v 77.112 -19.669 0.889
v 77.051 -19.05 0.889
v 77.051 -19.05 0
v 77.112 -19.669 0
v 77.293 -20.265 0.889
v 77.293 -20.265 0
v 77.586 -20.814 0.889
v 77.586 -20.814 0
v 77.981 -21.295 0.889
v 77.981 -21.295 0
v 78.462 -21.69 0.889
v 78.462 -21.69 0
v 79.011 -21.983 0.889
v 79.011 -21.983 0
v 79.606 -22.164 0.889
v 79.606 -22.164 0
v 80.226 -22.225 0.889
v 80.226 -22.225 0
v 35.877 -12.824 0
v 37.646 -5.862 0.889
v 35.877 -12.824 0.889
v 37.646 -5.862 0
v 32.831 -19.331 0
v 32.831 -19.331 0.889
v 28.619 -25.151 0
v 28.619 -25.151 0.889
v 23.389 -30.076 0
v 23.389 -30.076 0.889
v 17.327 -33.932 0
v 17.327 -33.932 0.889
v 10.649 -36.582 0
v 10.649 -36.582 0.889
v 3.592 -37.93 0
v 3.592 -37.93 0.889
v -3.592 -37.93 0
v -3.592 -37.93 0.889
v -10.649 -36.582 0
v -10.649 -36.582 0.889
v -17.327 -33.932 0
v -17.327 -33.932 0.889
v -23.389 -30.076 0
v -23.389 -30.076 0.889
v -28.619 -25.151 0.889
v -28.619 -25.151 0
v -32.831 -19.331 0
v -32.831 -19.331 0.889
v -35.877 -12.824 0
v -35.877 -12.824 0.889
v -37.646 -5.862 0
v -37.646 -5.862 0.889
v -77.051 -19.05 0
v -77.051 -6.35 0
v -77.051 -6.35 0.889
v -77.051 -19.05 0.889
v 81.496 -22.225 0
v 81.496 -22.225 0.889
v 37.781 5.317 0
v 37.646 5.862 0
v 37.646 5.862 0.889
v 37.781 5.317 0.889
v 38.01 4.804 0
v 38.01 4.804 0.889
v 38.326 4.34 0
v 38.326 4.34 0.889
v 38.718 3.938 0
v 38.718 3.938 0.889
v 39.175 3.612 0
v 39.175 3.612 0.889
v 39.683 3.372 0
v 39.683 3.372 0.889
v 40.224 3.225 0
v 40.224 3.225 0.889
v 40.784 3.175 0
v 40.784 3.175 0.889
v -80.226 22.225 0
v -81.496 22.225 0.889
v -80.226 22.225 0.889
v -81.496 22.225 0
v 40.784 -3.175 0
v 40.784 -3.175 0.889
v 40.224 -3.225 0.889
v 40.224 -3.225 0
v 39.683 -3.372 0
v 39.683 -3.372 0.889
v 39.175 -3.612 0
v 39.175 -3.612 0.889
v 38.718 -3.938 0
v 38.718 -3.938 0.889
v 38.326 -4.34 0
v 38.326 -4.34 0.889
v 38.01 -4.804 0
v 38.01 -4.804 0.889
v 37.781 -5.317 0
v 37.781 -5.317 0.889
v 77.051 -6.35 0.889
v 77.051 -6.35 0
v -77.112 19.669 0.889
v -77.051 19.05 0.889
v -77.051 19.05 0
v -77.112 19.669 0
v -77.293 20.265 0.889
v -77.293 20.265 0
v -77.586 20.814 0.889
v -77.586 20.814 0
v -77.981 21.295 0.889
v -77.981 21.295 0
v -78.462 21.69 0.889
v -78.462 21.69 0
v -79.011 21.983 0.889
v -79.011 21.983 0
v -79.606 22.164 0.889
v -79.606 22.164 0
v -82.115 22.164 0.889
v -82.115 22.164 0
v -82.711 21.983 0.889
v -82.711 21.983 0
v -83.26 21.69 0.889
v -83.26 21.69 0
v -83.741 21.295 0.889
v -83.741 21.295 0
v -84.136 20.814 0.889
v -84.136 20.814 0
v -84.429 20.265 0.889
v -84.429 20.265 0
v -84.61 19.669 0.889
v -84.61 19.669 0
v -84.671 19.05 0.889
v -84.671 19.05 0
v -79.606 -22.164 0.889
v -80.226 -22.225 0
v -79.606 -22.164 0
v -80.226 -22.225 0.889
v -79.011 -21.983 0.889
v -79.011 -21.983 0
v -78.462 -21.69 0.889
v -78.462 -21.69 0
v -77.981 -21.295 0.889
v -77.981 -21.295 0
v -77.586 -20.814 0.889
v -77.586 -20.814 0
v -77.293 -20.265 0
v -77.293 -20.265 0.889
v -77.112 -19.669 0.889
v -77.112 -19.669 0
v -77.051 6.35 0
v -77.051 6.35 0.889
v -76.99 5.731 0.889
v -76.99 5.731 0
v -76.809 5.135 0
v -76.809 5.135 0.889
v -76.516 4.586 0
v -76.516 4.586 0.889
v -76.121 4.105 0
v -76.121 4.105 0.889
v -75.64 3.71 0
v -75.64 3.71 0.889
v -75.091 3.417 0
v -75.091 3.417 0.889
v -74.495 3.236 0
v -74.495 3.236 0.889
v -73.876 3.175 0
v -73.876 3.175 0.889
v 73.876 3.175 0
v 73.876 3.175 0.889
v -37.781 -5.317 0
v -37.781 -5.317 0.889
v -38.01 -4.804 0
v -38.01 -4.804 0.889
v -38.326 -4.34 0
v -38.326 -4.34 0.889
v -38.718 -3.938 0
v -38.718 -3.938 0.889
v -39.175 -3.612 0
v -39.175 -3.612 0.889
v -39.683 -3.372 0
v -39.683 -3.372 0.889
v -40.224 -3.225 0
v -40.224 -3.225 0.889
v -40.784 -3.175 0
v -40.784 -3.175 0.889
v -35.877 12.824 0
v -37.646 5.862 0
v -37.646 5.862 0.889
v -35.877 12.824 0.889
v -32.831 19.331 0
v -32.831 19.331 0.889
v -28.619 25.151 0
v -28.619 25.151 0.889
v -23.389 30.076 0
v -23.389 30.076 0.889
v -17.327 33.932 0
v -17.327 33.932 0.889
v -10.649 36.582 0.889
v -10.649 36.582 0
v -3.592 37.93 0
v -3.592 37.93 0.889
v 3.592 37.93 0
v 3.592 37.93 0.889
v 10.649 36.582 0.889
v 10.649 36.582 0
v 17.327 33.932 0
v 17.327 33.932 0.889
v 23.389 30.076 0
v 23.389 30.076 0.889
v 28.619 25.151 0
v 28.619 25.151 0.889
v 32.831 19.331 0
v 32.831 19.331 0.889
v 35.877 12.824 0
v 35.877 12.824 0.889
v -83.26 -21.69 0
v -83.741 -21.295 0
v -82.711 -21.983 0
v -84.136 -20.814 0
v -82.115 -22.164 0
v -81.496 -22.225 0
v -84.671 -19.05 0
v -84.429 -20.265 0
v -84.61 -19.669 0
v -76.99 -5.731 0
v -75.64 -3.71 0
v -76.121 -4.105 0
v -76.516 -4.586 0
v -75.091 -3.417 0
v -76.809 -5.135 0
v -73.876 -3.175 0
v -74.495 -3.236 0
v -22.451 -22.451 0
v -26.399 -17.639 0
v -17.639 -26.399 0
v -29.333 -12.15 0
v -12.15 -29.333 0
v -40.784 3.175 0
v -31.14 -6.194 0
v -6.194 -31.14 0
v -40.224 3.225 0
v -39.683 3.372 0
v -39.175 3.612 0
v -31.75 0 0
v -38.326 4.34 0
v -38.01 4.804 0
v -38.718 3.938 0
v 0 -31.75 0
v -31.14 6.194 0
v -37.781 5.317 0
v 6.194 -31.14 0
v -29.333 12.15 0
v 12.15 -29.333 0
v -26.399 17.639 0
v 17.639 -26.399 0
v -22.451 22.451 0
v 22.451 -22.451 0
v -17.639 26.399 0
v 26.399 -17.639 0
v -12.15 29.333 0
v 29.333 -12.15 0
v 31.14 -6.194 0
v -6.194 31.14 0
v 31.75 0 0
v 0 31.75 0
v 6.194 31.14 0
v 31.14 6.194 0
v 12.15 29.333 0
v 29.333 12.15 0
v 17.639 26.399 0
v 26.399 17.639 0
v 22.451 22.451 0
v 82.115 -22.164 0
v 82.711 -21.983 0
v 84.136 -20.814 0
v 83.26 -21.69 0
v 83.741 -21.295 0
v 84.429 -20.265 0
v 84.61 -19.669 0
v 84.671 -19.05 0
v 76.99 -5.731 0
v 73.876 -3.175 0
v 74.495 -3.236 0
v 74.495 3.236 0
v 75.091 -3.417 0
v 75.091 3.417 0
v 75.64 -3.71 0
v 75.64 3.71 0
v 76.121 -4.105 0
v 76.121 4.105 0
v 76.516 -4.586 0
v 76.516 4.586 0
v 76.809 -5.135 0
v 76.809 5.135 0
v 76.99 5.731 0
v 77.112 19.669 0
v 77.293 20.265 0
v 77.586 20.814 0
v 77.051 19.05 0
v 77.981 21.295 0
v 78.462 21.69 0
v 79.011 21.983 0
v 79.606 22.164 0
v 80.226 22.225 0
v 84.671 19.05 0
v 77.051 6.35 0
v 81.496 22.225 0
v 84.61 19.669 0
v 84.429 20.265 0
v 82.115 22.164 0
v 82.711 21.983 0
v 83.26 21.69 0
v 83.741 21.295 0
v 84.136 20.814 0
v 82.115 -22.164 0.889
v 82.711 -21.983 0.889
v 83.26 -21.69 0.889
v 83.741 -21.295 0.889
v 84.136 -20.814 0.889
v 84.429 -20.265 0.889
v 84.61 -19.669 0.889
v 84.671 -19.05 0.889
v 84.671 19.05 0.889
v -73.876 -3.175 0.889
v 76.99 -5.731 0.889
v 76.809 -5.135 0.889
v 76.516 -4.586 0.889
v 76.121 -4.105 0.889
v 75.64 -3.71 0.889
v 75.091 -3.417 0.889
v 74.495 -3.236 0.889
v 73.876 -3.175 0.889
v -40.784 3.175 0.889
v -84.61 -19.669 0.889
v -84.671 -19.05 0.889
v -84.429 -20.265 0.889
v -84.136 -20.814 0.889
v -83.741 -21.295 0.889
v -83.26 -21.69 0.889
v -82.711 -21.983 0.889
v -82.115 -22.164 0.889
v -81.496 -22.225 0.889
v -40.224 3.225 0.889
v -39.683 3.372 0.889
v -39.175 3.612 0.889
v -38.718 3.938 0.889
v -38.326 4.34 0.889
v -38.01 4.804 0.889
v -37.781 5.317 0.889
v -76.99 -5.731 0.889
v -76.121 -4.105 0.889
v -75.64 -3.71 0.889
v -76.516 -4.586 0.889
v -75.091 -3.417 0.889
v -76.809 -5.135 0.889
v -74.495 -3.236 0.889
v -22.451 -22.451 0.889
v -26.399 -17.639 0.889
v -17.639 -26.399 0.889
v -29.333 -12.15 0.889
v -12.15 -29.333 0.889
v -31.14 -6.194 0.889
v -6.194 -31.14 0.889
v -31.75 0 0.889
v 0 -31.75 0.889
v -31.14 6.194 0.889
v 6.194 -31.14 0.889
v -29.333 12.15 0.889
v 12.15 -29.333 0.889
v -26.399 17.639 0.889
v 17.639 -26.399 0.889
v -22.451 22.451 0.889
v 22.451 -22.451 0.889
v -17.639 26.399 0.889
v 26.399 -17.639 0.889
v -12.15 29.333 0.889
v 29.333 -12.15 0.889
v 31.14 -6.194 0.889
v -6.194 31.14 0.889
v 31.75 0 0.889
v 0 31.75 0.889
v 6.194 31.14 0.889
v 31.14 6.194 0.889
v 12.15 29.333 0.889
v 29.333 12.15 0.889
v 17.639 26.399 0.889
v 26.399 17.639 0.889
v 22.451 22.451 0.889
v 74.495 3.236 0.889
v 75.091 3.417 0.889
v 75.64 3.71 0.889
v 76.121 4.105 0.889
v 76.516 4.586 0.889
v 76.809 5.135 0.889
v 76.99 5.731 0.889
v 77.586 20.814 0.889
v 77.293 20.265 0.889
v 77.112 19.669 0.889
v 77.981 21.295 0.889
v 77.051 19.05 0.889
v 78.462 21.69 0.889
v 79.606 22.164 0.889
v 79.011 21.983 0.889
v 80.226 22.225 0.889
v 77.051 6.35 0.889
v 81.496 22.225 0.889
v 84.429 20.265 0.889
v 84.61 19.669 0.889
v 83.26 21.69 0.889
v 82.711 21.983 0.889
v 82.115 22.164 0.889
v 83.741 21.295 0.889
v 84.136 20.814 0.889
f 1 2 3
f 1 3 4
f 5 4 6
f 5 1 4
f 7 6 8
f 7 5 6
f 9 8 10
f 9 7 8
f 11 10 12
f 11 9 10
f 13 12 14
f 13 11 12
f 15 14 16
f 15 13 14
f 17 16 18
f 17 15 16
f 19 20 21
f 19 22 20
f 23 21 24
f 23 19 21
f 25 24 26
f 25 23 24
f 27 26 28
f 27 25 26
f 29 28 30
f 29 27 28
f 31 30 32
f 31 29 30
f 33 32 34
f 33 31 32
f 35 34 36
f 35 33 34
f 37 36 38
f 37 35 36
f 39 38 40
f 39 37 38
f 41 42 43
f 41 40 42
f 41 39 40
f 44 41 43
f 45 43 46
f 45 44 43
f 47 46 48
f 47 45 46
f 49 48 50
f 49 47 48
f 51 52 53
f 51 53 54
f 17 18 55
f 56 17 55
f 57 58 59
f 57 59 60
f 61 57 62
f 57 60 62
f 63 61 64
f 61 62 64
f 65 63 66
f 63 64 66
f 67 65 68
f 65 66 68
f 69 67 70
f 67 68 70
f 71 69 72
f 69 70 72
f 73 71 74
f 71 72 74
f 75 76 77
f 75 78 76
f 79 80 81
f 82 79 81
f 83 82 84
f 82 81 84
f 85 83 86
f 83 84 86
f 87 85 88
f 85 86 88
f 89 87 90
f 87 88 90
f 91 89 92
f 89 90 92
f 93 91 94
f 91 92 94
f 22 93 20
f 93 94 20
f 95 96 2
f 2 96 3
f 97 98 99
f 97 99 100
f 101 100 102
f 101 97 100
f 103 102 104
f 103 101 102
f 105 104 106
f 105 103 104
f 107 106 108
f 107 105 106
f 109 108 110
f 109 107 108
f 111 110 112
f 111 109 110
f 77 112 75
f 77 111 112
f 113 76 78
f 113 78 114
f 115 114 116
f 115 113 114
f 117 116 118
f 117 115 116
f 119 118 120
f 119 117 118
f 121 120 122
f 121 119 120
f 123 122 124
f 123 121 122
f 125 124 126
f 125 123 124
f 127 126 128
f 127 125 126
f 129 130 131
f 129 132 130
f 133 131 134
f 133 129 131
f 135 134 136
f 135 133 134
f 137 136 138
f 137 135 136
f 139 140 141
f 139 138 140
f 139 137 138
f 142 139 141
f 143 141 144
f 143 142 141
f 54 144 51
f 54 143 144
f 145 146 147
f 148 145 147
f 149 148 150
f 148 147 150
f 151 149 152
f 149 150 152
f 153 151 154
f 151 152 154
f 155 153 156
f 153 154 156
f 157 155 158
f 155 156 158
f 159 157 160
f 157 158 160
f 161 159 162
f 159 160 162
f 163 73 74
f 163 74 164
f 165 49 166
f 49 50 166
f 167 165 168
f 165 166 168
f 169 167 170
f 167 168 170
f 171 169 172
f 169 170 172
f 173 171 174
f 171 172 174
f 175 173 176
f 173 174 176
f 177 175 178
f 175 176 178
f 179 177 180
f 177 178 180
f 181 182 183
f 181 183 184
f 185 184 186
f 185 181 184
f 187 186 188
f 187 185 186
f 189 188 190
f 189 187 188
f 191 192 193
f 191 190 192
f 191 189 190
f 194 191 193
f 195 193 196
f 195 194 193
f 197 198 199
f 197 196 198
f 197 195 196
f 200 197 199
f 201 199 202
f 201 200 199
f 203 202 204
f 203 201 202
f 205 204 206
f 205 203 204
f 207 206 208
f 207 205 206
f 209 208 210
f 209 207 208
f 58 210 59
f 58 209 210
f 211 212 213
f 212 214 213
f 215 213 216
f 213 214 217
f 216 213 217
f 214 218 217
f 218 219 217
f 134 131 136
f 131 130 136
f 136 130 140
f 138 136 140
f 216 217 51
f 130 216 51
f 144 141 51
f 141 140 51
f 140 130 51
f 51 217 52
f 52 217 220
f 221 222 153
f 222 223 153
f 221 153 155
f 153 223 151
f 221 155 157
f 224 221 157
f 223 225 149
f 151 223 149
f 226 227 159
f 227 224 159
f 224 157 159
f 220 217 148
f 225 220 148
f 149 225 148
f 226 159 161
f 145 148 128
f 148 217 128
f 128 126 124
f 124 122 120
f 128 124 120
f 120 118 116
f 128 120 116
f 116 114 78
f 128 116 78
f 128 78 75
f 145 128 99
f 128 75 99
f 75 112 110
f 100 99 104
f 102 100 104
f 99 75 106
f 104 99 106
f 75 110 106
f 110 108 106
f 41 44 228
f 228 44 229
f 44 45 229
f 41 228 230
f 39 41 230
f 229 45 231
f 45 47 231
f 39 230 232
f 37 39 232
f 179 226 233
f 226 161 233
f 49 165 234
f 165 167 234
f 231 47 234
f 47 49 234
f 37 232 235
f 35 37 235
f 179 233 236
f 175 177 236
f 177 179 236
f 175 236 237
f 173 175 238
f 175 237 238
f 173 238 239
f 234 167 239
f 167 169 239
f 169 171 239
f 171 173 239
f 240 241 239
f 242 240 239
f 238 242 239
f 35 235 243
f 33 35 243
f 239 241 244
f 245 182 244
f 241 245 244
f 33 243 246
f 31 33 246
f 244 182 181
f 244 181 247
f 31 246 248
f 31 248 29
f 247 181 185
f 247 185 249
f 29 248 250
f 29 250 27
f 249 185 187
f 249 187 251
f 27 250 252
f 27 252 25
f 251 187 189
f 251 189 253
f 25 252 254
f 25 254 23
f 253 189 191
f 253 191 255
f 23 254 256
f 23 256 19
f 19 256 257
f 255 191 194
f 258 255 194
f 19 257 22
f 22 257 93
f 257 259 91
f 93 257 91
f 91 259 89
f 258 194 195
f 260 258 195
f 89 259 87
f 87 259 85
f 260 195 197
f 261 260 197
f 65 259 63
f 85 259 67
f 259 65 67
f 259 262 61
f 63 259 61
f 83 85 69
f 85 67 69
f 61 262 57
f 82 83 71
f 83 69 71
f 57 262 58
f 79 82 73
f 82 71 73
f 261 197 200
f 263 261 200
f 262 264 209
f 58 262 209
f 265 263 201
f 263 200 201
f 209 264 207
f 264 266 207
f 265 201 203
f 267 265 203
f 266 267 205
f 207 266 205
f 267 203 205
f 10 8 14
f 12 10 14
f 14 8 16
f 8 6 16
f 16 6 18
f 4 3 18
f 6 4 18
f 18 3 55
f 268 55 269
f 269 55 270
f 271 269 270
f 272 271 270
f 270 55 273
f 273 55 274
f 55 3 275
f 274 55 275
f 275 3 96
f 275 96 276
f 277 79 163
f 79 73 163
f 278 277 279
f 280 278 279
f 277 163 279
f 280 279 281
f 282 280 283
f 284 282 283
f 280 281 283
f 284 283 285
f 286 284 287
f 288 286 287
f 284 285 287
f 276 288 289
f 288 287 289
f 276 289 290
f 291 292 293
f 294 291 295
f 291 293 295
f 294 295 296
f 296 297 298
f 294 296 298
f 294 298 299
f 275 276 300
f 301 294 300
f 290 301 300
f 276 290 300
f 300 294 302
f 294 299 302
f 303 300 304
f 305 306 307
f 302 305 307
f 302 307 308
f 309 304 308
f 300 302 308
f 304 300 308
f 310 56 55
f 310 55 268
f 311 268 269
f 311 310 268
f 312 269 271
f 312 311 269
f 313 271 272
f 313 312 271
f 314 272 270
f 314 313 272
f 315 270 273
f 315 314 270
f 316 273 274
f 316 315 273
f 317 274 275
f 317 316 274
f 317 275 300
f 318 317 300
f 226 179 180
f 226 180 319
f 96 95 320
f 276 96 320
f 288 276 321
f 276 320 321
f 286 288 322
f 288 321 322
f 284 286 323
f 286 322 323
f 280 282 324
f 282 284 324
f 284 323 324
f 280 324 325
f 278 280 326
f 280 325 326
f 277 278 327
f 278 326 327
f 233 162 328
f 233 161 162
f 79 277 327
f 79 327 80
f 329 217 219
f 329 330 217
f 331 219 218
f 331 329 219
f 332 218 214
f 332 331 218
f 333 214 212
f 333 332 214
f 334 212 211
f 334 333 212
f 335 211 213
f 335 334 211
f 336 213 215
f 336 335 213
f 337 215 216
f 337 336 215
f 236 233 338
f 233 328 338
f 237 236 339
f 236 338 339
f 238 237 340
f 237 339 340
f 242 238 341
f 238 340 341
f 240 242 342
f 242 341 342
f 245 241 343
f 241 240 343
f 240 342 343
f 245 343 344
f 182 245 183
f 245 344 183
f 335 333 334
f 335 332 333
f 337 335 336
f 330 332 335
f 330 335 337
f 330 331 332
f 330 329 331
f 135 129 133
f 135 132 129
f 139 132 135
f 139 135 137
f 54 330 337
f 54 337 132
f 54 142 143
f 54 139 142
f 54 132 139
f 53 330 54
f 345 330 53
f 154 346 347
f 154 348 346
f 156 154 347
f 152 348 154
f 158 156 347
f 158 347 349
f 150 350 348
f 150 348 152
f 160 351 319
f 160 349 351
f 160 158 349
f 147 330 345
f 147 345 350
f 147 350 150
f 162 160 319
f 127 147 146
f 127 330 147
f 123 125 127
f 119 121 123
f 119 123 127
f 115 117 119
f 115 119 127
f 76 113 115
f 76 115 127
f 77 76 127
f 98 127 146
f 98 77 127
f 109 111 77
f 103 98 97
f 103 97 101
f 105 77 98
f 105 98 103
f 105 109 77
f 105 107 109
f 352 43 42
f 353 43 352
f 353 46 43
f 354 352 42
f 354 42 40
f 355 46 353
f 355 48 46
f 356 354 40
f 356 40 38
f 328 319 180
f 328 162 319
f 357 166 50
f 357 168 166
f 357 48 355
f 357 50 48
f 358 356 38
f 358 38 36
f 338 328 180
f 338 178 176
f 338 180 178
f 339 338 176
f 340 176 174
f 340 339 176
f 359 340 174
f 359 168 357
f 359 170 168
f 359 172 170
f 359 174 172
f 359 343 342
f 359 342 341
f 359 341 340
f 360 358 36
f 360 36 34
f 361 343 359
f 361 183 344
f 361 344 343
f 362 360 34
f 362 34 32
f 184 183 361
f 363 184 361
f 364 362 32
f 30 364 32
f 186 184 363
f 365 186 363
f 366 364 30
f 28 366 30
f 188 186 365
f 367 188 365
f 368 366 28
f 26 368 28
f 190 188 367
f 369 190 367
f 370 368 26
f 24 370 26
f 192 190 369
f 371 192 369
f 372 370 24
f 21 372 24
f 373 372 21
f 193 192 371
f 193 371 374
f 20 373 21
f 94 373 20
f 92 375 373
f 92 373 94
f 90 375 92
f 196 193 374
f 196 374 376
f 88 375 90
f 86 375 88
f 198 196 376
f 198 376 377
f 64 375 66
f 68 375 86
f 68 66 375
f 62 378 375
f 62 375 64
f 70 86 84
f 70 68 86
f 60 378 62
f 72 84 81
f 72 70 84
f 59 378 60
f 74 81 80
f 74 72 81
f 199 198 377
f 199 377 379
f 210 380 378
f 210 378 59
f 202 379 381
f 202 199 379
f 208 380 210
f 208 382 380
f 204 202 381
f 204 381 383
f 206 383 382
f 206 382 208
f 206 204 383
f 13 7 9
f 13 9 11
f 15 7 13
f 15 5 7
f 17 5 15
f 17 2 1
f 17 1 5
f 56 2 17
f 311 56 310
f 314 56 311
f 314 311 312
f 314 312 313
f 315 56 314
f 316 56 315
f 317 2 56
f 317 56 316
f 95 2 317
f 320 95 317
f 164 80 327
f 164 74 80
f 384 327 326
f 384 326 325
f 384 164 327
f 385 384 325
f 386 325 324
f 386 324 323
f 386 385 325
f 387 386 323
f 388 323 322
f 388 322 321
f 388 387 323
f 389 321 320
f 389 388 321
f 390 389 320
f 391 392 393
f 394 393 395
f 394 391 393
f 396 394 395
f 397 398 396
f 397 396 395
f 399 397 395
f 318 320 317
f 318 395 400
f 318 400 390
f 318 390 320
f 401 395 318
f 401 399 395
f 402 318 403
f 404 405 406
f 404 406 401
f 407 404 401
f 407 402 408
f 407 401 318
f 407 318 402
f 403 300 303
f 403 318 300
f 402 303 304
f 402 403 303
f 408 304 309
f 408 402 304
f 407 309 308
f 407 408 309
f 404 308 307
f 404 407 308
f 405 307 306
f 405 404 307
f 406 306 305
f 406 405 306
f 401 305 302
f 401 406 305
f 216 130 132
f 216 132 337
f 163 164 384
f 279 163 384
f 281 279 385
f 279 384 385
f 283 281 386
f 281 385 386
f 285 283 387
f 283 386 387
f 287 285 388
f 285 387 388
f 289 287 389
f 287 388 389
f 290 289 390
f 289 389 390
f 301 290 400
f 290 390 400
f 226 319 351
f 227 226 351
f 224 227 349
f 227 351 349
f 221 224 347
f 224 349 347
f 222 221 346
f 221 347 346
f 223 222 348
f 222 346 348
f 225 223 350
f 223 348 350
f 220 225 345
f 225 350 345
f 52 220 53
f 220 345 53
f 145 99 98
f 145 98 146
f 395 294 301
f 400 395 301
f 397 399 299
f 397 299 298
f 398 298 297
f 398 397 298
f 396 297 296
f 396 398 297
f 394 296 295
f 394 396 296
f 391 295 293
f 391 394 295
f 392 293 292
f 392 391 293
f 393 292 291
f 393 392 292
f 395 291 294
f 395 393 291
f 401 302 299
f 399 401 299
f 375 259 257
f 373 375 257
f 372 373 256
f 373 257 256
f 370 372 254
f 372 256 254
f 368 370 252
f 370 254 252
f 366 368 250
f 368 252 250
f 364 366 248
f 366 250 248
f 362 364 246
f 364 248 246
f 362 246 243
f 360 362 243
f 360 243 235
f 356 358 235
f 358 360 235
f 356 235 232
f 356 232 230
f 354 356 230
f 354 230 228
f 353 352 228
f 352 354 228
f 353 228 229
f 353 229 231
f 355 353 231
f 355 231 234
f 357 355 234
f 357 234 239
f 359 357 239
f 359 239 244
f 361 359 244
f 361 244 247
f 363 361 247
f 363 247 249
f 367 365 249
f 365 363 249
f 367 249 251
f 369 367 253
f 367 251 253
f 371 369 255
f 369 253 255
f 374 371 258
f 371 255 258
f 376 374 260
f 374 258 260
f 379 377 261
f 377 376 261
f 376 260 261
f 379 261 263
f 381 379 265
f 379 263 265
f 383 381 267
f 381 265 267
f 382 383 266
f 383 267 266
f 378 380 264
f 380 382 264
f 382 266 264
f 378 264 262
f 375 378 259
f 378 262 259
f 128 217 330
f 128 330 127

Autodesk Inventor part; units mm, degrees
ref_plane "YZ Plane" through (0, 0, 0) normal (1, 0, 0) x (0, 1, 0)
ref_plane "XZ Plane" through (0, 0, 0) normal (0, 1, 0) x (-1, 0, 0)
ref_plane "XY Plane" through (0, 0, 0) normal (0, 0, 1) x (1, 0, 0)
sketch "Sketch1" plane through (0, 0, 0) normal (0, 0, 1) x (1, 0, 0)
  circle A0 centre (0, 0) radius 38.1
  circle A1 centre (0, 0) radius 31.75
  line L0 (-84.6709, -3.175) -> (-84.6709, 3.175)
  line L1 (84.6709, 3.175) -> (84.6709, -3.175)
  line L2 (84.6709, -3.175) -> (-84.6709, 3.175) construction
  line L3 (-84.6709, -3.175) -> (84.6709, 3.175) construction
  line L4 (84.6709, -3.175) -> (37.9675, -3.175)
  line L5 (-37.9675, -3.175) -> (-84.6709, -3.175)
  line L6 (-84.6709, 3.175) -> (-37.9675, 3.175)
  line L7 (37.9675, 3.175) -> (84.6709, 3.175)
  line L8 (-84.6709, 22.225) -> (-77.0509, 22.225)
  line L9 (-77.0509, 22.225) -> (-77.0509, -22.225)
  line L10 (-77.0509, -22.225) -> (-84.6709, -22.225)
  line L11 (-84.6709, -22.225) -> (-84.6709, 22.225)
  line L12 (0, 31.75) -> (0, -31.75) construction
  line L13 (84.6709, 22.225) -> (77.0509, 22.225)
  line L14 (77.0509, 22.225) -> (77.0509, -22.225)
  line L15 (77.0509, -22.225) -> (84.6709, -22.225)
  line L16 (84.6709, -22.225) -> (84.6709, 22.225)
  dimension "d0" = 76.2
  dimension "d1" = 6.35
  dimension "d2" = 169.3418
  dimension "d4" = 6.35
  dimension "d5" = 19.05
  dimension "d6" = 19.05
  dimension "d7" = 7.62
extrude "Plate1" add sketch "Sketch1" along normal blind 0.889
fillet "Corner Round1" radius 3.175 16 edges at (77.0509, -3.175, 0.4445) (77.0509, -22.225, 0.4445) (77.0509, 3.175, 0.4445) (77.0509, 22.225, 0.4445) (84.6709, -22.225, 0.4445) (84.6709, 22.225, 0.4445) (37.9675, -3.175, 0.4445) (-77.0509, -3.175, 0.4445) (-77.0509, -22.225, 0.4445) (-77.0509, 3.175, 0.4445) (-77.0509, 22.225, 0.4445) (-84.6709, -22.225, 0.4445) (-84.6709, 22.225, 0.4445) (-37.9675, 3.175, 0.4445) (-37.9675, -3.175, 0.4445) (37.9675, 3.175, 0.4445)
equation "\"d8\" = Thickness"
equation "\"BendRadius\" = Thickness"
equation "\"BendReliefWidth\" = Thickness"
equation "\"BendReliefDepth\" = 0.5 * Thickness"
equation "\"CornerReliefSize\" = 4 * Thickness"
equation "\"MinimumRemnant\" = 2 * Thickness"
equation "\"TransitionRadius\" = BendRadius"
equation "\"JacobiRadiusSize\" = Thickness"
equation "\"GapSize\" = Thickness"
equation "\"Thickness\" = 0.889"
properties part number "Frame" material "Aluminum 6061"
